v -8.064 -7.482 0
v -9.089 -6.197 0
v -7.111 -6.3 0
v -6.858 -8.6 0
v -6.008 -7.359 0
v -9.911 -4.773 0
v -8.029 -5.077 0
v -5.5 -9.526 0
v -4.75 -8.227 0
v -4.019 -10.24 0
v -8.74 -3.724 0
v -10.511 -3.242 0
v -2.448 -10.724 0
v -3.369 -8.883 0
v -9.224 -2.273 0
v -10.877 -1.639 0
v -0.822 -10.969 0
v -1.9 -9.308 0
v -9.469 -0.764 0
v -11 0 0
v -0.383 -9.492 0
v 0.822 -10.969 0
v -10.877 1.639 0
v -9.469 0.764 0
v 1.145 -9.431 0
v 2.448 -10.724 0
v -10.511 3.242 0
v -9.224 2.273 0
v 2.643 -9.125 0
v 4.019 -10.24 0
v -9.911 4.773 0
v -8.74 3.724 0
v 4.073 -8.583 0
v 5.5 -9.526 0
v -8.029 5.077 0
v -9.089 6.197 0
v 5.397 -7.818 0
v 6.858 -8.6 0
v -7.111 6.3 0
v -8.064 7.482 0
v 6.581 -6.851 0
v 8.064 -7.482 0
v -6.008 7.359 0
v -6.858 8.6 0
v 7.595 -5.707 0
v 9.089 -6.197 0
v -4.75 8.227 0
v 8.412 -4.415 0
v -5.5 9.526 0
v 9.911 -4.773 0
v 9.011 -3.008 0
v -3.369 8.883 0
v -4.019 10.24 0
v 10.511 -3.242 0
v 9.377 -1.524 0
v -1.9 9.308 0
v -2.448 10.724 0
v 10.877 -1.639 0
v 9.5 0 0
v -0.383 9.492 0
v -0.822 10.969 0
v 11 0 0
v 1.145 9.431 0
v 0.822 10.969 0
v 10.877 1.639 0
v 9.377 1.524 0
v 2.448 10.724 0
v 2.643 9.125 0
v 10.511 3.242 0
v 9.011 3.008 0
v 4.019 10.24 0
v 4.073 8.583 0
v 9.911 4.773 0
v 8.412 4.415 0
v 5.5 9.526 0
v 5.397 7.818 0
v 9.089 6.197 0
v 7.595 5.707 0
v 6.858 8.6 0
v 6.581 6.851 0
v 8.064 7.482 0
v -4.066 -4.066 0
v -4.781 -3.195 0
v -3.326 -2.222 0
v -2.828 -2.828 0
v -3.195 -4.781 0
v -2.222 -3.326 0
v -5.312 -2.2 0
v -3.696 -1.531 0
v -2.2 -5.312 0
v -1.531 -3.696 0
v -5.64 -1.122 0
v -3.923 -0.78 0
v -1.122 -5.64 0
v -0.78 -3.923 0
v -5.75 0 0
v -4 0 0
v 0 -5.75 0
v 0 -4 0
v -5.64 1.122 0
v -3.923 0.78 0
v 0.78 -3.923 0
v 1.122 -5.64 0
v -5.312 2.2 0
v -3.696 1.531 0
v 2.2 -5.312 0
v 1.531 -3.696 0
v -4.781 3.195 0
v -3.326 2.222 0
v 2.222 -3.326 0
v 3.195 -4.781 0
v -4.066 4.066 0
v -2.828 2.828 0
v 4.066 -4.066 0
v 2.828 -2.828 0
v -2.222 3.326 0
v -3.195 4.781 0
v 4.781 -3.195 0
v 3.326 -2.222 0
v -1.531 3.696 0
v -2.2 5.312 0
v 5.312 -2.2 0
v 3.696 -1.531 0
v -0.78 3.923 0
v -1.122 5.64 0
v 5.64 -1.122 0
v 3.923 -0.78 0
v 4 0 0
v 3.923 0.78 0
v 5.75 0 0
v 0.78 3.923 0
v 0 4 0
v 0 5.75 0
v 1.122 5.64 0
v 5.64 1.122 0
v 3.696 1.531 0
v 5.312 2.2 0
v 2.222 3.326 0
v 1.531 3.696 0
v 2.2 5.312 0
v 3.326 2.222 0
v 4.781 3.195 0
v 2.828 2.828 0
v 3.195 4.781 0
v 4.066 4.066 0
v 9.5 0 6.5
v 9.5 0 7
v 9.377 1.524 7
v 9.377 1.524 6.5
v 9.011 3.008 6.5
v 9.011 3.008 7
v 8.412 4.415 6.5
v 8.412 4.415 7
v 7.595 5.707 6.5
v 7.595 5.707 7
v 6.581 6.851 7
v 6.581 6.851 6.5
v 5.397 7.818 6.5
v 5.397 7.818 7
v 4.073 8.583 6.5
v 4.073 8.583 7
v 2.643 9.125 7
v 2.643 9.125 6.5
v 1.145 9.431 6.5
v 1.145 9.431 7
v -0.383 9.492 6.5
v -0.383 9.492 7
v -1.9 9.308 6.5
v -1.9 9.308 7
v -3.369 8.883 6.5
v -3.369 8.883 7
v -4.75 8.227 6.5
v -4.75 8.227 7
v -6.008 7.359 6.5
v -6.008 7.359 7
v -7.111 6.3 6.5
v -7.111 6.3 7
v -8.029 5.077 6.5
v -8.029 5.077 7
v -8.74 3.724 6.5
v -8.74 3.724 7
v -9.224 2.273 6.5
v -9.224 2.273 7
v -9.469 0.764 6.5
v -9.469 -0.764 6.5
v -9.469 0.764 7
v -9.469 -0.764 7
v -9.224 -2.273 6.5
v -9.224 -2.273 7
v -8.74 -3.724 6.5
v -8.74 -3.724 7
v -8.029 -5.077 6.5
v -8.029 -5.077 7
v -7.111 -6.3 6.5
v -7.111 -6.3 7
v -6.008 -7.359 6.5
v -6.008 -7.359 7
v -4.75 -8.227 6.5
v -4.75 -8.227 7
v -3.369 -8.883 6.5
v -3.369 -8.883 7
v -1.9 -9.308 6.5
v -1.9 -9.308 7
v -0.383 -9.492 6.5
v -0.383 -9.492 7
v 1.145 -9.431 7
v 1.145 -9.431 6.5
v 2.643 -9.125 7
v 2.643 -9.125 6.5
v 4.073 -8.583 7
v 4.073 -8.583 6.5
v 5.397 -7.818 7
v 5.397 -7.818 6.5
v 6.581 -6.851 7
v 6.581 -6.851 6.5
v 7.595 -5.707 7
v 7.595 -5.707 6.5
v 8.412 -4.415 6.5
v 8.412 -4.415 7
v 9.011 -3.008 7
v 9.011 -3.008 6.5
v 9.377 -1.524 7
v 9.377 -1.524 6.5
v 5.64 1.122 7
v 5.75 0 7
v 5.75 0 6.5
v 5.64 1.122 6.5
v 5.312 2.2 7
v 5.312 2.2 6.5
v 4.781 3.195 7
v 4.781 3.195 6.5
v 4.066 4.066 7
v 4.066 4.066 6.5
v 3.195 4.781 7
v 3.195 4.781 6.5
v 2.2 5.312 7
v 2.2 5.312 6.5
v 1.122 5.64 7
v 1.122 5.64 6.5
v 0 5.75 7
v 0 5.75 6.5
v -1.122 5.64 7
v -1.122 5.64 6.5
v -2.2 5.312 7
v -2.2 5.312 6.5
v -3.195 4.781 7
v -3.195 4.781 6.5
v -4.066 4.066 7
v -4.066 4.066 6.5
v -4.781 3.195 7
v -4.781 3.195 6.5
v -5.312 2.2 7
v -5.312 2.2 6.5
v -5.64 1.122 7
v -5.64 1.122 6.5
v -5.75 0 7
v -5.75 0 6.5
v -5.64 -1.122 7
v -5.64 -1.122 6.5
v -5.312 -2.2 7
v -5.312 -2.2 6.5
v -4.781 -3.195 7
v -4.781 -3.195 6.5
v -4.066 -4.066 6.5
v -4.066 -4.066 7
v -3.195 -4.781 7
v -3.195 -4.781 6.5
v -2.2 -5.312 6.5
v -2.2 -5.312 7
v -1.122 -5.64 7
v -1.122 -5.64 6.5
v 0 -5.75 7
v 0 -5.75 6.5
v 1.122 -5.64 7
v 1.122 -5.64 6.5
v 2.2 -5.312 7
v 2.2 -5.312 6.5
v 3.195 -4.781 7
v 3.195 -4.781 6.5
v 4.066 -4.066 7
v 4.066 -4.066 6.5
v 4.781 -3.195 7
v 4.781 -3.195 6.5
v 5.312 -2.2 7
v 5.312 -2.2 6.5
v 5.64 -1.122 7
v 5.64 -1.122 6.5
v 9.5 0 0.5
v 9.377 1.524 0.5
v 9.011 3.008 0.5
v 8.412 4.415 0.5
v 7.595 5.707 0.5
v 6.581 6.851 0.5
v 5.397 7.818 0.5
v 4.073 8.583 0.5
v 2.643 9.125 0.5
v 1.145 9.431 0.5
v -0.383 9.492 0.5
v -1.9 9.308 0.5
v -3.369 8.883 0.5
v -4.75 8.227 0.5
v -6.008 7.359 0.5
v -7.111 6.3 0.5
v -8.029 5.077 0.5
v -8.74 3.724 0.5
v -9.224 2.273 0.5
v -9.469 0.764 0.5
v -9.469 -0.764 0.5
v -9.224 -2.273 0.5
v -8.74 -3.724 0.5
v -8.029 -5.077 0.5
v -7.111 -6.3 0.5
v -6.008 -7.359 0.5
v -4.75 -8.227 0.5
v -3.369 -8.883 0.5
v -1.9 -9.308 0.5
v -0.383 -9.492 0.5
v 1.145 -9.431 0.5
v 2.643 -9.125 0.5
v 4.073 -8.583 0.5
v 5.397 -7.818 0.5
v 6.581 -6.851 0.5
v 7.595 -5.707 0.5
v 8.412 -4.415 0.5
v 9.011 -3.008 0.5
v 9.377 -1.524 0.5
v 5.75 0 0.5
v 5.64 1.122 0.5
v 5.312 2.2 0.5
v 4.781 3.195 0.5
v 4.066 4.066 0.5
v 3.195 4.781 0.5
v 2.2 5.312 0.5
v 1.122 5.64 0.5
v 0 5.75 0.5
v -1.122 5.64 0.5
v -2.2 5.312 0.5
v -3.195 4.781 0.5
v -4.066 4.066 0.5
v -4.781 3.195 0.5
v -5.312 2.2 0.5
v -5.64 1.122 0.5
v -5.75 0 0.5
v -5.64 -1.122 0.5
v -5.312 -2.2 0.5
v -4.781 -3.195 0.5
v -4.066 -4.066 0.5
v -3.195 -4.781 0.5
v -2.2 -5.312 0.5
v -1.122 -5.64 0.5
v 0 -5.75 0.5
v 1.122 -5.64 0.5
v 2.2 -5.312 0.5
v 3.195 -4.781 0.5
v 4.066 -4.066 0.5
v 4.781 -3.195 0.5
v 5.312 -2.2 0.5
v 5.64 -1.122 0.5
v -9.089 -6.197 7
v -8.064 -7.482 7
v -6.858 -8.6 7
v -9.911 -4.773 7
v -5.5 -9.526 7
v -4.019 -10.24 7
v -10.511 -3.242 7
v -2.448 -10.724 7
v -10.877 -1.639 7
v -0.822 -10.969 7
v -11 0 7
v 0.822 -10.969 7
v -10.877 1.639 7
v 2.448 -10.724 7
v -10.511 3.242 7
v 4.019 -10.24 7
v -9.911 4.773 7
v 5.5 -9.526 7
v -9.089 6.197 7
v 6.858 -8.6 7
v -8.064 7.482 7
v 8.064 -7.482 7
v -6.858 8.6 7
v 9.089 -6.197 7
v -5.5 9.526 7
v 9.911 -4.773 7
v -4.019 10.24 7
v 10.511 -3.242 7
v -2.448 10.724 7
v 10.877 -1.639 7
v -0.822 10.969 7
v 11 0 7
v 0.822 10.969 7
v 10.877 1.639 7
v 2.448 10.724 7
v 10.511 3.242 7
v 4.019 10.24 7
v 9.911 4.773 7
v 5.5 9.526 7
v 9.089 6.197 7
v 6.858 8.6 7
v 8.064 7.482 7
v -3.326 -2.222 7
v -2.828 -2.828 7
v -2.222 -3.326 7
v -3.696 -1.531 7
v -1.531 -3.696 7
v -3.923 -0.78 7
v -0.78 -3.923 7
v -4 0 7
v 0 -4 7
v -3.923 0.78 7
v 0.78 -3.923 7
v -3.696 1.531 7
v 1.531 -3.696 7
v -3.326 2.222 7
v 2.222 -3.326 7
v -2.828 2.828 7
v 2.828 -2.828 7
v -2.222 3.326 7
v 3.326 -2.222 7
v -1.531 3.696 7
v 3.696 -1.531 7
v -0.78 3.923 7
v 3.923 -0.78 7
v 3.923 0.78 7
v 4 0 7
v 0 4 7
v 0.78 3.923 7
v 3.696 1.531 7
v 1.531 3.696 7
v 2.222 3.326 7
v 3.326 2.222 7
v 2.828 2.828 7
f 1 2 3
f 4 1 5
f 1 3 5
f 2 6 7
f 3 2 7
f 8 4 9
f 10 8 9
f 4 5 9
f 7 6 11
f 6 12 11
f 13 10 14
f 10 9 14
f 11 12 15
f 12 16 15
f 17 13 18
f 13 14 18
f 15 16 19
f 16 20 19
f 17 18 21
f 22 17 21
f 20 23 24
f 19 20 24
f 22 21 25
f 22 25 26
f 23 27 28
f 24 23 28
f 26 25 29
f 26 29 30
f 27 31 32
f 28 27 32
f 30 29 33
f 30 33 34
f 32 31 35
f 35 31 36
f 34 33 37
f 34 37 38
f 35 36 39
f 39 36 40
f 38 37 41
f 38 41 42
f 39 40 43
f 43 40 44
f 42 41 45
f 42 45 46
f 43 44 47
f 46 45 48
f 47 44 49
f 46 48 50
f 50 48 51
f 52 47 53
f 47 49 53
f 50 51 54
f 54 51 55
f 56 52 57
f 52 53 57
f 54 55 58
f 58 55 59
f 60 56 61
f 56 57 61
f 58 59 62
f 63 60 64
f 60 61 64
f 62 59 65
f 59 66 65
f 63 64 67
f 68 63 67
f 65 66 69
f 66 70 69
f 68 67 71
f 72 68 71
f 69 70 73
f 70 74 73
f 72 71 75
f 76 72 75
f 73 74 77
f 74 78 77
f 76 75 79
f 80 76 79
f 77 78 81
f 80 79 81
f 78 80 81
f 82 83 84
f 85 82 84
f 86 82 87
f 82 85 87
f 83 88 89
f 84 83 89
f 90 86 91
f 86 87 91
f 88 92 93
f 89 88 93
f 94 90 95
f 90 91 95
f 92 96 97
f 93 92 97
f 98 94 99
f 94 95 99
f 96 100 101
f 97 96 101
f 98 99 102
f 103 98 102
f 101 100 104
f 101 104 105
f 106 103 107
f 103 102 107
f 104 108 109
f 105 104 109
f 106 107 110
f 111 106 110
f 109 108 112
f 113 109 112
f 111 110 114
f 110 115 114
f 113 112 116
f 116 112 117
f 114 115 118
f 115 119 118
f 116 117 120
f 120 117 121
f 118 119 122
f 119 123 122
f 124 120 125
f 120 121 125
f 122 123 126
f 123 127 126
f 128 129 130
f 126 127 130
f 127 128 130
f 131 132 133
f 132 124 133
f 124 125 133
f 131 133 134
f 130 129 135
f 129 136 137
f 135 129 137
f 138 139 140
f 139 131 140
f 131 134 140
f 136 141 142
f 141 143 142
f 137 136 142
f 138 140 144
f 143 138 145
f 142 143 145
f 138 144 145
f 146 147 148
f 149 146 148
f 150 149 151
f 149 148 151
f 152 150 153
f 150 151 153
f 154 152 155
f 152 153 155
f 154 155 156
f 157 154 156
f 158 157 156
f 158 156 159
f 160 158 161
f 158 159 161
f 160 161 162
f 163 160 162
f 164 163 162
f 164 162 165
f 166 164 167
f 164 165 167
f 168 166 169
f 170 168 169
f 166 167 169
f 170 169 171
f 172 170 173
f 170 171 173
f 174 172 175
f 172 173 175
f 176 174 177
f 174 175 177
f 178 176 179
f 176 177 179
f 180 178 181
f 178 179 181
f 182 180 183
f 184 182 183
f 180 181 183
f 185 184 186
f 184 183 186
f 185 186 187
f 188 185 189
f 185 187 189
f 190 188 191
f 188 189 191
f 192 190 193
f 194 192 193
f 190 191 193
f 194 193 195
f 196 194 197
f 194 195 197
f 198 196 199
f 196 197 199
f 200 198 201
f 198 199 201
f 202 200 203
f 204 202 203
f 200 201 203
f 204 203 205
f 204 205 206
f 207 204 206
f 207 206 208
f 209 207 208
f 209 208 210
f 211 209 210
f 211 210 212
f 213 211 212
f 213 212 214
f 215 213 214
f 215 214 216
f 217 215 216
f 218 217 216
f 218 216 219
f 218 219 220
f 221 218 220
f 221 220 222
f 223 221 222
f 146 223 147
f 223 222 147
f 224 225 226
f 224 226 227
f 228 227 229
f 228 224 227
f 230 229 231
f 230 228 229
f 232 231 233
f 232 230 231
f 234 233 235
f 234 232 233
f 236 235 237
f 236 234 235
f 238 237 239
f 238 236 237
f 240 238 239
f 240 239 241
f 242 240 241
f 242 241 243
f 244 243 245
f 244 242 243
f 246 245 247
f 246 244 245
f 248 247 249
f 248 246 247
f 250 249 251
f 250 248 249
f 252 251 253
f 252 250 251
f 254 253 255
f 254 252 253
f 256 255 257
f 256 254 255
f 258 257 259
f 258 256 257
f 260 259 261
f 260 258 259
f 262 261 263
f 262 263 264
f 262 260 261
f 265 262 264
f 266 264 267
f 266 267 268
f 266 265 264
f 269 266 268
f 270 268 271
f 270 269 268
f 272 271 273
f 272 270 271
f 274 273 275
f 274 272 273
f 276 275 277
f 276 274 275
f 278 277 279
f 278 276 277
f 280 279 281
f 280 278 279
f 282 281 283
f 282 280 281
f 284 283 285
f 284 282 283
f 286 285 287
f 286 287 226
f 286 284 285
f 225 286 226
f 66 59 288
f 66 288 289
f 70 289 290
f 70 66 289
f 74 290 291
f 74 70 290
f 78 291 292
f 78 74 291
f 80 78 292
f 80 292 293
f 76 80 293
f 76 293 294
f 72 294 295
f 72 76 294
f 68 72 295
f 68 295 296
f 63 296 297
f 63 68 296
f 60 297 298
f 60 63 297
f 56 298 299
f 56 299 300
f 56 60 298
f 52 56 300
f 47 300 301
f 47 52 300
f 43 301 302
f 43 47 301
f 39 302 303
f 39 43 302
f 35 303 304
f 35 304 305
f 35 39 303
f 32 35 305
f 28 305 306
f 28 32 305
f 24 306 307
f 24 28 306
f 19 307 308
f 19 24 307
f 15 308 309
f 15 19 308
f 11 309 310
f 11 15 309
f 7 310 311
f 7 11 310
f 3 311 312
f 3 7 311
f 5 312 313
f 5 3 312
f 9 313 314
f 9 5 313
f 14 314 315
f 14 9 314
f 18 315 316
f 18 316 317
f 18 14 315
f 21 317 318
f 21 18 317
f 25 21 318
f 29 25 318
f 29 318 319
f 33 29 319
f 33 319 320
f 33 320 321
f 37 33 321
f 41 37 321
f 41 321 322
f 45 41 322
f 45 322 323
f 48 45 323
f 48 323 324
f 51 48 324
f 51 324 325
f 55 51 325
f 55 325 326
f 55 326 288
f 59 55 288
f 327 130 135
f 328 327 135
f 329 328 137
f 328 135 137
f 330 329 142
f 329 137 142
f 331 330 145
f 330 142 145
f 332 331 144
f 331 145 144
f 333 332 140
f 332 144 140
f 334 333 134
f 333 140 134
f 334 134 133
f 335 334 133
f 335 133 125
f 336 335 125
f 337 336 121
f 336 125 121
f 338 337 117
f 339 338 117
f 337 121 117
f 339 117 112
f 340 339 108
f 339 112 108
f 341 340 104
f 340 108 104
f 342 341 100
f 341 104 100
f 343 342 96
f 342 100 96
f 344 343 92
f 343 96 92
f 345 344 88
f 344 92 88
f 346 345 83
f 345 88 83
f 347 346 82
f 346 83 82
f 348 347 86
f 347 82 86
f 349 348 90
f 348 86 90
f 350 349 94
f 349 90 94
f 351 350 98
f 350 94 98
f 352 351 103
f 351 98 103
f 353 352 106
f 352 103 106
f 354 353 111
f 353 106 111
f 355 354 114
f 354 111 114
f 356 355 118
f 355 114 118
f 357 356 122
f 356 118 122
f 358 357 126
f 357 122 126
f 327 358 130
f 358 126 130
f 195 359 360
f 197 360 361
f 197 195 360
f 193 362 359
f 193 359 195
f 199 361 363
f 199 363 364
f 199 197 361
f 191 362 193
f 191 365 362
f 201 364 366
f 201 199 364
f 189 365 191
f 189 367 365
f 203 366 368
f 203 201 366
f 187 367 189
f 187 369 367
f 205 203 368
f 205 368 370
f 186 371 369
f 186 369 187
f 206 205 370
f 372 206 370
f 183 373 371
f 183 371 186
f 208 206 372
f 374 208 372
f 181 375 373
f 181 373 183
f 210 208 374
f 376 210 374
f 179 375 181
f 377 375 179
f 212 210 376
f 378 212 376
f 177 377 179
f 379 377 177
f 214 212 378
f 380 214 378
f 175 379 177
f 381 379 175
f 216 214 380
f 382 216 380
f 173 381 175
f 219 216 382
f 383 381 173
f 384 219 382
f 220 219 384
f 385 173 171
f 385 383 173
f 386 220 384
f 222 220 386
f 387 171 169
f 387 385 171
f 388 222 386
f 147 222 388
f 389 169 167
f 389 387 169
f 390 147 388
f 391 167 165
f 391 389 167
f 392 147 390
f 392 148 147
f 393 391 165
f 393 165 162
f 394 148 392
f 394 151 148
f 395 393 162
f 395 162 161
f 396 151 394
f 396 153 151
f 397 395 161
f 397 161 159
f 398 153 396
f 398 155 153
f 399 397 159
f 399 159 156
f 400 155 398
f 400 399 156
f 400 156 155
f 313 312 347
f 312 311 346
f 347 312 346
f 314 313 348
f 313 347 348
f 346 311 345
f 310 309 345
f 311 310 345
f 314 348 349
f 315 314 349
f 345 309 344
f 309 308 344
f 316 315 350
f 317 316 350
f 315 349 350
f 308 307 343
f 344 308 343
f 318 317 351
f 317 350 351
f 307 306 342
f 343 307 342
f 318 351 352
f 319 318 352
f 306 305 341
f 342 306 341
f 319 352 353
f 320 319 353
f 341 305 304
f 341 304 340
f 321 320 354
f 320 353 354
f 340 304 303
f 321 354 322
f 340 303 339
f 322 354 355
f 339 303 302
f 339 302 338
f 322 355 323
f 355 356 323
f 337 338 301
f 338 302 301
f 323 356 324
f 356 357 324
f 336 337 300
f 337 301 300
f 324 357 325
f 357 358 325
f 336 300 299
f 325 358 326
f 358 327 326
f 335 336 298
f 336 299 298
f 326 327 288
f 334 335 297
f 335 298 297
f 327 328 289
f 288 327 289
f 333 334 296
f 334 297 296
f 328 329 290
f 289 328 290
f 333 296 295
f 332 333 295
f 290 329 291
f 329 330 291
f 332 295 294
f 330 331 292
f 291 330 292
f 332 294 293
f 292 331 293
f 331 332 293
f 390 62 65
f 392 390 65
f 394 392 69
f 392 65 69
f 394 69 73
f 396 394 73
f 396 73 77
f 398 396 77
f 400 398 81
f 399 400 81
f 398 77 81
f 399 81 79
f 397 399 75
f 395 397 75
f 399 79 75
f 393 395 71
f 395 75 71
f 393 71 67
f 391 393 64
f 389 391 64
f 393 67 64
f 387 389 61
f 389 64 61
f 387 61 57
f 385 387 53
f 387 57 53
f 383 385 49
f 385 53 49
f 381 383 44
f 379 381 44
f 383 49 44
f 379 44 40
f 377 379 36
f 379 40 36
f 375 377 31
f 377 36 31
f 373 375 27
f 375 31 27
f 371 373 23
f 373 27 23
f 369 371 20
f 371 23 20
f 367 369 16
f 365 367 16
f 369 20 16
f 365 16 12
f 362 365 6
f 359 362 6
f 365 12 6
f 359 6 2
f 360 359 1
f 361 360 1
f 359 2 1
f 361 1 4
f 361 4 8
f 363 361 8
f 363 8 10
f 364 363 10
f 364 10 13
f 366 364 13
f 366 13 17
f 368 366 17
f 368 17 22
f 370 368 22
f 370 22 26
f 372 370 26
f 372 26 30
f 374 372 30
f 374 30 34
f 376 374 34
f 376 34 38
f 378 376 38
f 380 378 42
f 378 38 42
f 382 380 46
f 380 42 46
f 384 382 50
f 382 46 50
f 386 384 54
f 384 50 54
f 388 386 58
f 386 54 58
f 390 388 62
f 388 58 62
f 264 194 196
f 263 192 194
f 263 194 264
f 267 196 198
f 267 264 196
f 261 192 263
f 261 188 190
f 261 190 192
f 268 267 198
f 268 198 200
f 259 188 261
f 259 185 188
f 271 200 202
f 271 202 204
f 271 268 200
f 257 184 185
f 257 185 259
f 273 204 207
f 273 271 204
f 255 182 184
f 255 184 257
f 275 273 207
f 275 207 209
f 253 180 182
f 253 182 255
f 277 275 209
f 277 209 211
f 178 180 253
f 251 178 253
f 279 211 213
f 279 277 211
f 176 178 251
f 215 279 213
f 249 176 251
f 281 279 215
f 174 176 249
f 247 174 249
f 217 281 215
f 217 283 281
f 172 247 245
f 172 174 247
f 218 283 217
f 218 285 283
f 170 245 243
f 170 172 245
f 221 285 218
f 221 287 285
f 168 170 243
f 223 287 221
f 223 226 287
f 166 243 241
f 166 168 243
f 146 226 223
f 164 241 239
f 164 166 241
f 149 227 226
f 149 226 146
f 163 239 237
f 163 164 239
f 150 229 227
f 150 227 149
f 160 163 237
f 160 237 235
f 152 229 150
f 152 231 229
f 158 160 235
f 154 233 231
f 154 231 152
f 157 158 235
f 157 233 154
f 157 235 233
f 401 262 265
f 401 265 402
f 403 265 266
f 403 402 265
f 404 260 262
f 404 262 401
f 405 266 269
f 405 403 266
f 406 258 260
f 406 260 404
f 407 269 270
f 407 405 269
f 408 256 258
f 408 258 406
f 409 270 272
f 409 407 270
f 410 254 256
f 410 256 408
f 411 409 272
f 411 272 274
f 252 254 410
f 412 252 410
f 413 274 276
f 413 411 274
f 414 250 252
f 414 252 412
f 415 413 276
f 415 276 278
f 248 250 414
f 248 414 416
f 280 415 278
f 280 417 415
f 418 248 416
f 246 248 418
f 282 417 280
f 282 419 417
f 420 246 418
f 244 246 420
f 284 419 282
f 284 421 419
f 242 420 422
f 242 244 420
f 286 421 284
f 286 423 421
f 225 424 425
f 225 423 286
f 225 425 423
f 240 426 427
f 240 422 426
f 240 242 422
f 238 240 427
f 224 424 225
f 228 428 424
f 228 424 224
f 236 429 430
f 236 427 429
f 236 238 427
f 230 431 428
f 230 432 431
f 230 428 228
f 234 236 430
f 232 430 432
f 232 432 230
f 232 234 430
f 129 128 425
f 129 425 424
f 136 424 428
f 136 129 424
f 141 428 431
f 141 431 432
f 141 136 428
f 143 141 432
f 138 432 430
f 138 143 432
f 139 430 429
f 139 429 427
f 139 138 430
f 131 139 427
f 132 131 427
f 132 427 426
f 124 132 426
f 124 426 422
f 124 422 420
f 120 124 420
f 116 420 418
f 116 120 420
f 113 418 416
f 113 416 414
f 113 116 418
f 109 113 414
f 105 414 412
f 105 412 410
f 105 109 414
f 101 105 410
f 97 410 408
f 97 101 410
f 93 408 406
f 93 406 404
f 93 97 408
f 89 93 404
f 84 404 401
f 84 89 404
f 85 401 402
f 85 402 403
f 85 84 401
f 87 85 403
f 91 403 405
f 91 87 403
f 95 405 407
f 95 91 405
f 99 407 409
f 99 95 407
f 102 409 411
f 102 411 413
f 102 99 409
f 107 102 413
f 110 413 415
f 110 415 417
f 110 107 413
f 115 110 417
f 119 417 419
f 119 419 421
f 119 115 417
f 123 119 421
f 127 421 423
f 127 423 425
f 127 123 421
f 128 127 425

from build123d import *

# Parameters (mm, degrees)
SKETCH_R        = 11
SKETCH_R_2      = 4
PAD_DEPTH       = 7
SKETCH001_R     = 9.5
SKETCH001_R_2   = 5.75
POCKET_DEPTH    = 0.5
SKETCH002_R     = 9.5
SKETCH002_R_2   = 5.75
POCKET001_DEPTH = 0.5


with BuildPart() as part:
    # Sketch → Pad (new body)
    with BuildSketch(Plane.XY):
        Circle(SKETCH_R)
        Circle(SKETCH_R_2, mode=Mode.SUBTRACT)
    extrude(amount=PAD_DEPTH)

    # Sketch001 → Pocket (cut)
    with BuildSketch(Plane.XY):
        Circle(SKETCH001_R)
        Circle(SKETCH001_R_2, mode=Mode.SUBTRACT)
    extrude(amount=POCKET_DEPTH, mode=Mode.SUBTRACT)

    # Sketch002 (on DatumPlane) → Pocket001 (cut)
    with BuildSketch(Plane.XY.offset(7)):
        Circle(SKETCH002_R)
        Circle(SKETCH002_R_2, mode=Mode.SUBTRACT)
    extrude(amount=-POCKET001_DEPTH, mode=Mode.SUBTRACT)


solid = part.part
